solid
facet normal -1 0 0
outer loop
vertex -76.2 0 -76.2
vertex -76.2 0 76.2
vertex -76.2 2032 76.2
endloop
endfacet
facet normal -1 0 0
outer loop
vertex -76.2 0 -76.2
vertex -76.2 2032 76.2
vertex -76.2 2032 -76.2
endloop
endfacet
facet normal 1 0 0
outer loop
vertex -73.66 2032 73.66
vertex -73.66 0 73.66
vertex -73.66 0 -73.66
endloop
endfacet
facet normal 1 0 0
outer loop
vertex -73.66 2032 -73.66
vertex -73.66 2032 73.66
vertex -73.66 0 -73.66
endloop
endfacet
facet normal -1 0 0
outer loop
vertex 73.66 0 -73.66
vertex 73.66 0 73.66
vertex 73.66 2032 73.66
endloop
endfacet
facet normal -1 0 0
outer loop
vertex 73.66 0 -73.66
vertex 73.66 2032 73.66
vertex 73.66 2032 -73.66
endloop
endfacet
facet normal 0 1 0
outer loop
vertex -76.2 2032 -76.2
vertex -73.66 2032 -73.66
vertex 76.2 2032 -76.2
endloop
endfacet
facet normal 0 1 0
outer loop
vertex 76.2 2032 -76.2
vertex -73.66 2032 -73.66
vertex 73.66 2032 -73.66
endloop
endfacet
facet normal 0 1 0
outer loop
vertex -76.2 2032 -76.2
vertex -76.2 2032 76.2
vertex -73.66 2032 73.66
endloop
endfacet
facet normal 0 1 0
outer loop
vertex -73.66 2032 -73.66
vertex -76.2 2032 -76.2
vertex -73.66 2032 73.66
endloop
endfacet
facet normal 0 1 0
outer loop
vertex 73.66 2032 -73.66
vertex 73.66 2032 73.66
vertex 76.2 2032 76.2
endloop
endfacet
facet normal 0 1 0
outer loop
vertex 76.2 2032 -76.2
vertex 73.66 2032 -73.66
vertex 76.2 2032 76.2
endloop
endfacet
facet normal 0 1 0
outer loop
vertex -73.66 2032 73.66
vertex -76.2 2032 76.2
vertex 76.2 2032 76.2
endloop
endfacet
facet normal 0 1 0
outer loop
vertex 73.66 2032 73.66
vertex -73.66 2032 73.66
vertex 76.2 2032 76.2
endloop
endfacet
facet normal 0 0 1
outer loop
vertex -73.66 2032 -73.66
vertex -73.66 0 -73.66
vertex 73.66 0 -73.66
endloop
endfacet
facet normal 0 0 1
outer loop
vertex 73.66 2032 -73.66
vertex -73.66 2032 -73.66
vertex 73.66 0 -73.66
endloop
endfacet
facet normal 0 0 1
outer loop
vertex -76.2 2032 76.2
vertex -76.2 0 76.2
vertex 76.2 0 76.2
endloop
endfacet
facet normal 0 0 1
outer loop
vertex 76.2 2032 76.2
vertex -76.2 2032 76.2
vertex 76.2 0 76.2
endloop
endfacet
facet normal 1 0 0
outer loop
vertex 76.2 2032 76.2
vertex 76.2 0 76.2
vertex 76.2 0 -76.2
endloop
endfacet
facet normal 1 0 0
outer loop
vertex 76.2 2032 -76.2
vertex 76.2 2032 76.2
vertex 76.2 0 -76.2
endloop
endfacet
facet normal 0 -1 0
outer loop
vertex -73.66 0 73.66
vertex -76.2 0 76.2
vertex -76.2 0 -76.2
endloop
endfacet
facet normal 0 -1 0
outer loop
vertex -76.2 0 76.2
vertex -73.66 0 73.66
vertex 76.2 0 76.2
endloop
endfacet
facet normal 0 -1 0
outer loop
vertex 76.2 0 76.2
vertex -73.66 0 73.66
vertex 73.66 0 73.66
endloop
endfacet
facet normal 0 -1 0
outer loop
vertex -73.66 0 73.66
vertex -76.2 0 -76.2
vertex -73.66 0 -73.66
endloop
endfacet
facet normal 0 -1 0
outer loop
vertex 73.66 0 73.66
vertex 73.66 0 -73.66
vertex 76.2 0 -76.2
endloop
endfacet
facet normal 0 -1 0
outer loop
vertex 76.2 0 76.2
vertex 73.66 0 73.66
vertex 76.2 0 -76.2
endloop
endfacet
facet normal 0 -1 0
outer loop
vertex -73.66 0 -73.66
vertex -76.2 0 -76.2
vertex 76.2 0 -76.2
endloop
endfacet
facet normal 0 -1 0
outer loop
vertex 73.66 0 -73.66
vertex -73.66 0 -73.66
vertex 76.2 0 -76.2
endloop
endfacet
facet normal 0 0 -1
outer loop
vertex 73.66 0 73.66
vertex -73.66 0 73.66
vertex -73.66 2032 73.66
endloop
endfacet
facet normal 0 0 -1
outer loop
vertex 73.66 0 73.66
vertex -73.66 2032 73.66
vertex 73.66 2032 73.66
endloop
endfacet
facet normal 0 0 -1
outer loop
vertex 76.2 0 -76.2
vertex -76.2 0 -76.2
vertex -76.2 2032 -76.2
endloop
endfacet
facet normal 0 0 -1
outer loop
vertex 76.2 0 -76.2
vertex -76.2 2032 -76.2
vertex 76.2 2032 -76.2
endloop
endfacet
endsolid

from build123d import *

# Parameters (mm, degrees)
SKETCH1_W           = 152.4
SKETCH1_H           = 152.4
SKETCH1_W_2         = 147.32
SKETCH1_H_2         = 147.32
BOSS_EXTRUDE1_DEPTH = 6604
SKETCH2_W           = 152.4
SKETCH2_H           = 4572
CUT_EXTRUDE1_DEPTH  = 6607.197711241


with BuildPart() as part:
    # Sketch1 → Boss-Extrude1 (new body)
    with BuildSketch(Plane(origin=(0, 0, 0), x_dir=(1, 0, 0), z_dir=(0, 1, 0))):
        Rectangle(SKETCH1_W, SKETCH1_H)
        Rectangle(SKETCH1_W_2, SKETCH1_H_2, mode=Mode.SUBTRACT)
    extrude(amount=BOSS_EXTRUDE1_DEPTH)

    # Sketch2 → Cut-Extrude1 (cut, through all)
    with BuildSketch(Plane.XY.offset(76.2)):
        with Locations((0, 4318)):
            Rectangle(SKETCH2_W, SKETCH2_H)
    extrude(amount=-CUT_EXTRUDE1_DEPTH, mode=Mode.SUBTRACT)


solid = part.part
